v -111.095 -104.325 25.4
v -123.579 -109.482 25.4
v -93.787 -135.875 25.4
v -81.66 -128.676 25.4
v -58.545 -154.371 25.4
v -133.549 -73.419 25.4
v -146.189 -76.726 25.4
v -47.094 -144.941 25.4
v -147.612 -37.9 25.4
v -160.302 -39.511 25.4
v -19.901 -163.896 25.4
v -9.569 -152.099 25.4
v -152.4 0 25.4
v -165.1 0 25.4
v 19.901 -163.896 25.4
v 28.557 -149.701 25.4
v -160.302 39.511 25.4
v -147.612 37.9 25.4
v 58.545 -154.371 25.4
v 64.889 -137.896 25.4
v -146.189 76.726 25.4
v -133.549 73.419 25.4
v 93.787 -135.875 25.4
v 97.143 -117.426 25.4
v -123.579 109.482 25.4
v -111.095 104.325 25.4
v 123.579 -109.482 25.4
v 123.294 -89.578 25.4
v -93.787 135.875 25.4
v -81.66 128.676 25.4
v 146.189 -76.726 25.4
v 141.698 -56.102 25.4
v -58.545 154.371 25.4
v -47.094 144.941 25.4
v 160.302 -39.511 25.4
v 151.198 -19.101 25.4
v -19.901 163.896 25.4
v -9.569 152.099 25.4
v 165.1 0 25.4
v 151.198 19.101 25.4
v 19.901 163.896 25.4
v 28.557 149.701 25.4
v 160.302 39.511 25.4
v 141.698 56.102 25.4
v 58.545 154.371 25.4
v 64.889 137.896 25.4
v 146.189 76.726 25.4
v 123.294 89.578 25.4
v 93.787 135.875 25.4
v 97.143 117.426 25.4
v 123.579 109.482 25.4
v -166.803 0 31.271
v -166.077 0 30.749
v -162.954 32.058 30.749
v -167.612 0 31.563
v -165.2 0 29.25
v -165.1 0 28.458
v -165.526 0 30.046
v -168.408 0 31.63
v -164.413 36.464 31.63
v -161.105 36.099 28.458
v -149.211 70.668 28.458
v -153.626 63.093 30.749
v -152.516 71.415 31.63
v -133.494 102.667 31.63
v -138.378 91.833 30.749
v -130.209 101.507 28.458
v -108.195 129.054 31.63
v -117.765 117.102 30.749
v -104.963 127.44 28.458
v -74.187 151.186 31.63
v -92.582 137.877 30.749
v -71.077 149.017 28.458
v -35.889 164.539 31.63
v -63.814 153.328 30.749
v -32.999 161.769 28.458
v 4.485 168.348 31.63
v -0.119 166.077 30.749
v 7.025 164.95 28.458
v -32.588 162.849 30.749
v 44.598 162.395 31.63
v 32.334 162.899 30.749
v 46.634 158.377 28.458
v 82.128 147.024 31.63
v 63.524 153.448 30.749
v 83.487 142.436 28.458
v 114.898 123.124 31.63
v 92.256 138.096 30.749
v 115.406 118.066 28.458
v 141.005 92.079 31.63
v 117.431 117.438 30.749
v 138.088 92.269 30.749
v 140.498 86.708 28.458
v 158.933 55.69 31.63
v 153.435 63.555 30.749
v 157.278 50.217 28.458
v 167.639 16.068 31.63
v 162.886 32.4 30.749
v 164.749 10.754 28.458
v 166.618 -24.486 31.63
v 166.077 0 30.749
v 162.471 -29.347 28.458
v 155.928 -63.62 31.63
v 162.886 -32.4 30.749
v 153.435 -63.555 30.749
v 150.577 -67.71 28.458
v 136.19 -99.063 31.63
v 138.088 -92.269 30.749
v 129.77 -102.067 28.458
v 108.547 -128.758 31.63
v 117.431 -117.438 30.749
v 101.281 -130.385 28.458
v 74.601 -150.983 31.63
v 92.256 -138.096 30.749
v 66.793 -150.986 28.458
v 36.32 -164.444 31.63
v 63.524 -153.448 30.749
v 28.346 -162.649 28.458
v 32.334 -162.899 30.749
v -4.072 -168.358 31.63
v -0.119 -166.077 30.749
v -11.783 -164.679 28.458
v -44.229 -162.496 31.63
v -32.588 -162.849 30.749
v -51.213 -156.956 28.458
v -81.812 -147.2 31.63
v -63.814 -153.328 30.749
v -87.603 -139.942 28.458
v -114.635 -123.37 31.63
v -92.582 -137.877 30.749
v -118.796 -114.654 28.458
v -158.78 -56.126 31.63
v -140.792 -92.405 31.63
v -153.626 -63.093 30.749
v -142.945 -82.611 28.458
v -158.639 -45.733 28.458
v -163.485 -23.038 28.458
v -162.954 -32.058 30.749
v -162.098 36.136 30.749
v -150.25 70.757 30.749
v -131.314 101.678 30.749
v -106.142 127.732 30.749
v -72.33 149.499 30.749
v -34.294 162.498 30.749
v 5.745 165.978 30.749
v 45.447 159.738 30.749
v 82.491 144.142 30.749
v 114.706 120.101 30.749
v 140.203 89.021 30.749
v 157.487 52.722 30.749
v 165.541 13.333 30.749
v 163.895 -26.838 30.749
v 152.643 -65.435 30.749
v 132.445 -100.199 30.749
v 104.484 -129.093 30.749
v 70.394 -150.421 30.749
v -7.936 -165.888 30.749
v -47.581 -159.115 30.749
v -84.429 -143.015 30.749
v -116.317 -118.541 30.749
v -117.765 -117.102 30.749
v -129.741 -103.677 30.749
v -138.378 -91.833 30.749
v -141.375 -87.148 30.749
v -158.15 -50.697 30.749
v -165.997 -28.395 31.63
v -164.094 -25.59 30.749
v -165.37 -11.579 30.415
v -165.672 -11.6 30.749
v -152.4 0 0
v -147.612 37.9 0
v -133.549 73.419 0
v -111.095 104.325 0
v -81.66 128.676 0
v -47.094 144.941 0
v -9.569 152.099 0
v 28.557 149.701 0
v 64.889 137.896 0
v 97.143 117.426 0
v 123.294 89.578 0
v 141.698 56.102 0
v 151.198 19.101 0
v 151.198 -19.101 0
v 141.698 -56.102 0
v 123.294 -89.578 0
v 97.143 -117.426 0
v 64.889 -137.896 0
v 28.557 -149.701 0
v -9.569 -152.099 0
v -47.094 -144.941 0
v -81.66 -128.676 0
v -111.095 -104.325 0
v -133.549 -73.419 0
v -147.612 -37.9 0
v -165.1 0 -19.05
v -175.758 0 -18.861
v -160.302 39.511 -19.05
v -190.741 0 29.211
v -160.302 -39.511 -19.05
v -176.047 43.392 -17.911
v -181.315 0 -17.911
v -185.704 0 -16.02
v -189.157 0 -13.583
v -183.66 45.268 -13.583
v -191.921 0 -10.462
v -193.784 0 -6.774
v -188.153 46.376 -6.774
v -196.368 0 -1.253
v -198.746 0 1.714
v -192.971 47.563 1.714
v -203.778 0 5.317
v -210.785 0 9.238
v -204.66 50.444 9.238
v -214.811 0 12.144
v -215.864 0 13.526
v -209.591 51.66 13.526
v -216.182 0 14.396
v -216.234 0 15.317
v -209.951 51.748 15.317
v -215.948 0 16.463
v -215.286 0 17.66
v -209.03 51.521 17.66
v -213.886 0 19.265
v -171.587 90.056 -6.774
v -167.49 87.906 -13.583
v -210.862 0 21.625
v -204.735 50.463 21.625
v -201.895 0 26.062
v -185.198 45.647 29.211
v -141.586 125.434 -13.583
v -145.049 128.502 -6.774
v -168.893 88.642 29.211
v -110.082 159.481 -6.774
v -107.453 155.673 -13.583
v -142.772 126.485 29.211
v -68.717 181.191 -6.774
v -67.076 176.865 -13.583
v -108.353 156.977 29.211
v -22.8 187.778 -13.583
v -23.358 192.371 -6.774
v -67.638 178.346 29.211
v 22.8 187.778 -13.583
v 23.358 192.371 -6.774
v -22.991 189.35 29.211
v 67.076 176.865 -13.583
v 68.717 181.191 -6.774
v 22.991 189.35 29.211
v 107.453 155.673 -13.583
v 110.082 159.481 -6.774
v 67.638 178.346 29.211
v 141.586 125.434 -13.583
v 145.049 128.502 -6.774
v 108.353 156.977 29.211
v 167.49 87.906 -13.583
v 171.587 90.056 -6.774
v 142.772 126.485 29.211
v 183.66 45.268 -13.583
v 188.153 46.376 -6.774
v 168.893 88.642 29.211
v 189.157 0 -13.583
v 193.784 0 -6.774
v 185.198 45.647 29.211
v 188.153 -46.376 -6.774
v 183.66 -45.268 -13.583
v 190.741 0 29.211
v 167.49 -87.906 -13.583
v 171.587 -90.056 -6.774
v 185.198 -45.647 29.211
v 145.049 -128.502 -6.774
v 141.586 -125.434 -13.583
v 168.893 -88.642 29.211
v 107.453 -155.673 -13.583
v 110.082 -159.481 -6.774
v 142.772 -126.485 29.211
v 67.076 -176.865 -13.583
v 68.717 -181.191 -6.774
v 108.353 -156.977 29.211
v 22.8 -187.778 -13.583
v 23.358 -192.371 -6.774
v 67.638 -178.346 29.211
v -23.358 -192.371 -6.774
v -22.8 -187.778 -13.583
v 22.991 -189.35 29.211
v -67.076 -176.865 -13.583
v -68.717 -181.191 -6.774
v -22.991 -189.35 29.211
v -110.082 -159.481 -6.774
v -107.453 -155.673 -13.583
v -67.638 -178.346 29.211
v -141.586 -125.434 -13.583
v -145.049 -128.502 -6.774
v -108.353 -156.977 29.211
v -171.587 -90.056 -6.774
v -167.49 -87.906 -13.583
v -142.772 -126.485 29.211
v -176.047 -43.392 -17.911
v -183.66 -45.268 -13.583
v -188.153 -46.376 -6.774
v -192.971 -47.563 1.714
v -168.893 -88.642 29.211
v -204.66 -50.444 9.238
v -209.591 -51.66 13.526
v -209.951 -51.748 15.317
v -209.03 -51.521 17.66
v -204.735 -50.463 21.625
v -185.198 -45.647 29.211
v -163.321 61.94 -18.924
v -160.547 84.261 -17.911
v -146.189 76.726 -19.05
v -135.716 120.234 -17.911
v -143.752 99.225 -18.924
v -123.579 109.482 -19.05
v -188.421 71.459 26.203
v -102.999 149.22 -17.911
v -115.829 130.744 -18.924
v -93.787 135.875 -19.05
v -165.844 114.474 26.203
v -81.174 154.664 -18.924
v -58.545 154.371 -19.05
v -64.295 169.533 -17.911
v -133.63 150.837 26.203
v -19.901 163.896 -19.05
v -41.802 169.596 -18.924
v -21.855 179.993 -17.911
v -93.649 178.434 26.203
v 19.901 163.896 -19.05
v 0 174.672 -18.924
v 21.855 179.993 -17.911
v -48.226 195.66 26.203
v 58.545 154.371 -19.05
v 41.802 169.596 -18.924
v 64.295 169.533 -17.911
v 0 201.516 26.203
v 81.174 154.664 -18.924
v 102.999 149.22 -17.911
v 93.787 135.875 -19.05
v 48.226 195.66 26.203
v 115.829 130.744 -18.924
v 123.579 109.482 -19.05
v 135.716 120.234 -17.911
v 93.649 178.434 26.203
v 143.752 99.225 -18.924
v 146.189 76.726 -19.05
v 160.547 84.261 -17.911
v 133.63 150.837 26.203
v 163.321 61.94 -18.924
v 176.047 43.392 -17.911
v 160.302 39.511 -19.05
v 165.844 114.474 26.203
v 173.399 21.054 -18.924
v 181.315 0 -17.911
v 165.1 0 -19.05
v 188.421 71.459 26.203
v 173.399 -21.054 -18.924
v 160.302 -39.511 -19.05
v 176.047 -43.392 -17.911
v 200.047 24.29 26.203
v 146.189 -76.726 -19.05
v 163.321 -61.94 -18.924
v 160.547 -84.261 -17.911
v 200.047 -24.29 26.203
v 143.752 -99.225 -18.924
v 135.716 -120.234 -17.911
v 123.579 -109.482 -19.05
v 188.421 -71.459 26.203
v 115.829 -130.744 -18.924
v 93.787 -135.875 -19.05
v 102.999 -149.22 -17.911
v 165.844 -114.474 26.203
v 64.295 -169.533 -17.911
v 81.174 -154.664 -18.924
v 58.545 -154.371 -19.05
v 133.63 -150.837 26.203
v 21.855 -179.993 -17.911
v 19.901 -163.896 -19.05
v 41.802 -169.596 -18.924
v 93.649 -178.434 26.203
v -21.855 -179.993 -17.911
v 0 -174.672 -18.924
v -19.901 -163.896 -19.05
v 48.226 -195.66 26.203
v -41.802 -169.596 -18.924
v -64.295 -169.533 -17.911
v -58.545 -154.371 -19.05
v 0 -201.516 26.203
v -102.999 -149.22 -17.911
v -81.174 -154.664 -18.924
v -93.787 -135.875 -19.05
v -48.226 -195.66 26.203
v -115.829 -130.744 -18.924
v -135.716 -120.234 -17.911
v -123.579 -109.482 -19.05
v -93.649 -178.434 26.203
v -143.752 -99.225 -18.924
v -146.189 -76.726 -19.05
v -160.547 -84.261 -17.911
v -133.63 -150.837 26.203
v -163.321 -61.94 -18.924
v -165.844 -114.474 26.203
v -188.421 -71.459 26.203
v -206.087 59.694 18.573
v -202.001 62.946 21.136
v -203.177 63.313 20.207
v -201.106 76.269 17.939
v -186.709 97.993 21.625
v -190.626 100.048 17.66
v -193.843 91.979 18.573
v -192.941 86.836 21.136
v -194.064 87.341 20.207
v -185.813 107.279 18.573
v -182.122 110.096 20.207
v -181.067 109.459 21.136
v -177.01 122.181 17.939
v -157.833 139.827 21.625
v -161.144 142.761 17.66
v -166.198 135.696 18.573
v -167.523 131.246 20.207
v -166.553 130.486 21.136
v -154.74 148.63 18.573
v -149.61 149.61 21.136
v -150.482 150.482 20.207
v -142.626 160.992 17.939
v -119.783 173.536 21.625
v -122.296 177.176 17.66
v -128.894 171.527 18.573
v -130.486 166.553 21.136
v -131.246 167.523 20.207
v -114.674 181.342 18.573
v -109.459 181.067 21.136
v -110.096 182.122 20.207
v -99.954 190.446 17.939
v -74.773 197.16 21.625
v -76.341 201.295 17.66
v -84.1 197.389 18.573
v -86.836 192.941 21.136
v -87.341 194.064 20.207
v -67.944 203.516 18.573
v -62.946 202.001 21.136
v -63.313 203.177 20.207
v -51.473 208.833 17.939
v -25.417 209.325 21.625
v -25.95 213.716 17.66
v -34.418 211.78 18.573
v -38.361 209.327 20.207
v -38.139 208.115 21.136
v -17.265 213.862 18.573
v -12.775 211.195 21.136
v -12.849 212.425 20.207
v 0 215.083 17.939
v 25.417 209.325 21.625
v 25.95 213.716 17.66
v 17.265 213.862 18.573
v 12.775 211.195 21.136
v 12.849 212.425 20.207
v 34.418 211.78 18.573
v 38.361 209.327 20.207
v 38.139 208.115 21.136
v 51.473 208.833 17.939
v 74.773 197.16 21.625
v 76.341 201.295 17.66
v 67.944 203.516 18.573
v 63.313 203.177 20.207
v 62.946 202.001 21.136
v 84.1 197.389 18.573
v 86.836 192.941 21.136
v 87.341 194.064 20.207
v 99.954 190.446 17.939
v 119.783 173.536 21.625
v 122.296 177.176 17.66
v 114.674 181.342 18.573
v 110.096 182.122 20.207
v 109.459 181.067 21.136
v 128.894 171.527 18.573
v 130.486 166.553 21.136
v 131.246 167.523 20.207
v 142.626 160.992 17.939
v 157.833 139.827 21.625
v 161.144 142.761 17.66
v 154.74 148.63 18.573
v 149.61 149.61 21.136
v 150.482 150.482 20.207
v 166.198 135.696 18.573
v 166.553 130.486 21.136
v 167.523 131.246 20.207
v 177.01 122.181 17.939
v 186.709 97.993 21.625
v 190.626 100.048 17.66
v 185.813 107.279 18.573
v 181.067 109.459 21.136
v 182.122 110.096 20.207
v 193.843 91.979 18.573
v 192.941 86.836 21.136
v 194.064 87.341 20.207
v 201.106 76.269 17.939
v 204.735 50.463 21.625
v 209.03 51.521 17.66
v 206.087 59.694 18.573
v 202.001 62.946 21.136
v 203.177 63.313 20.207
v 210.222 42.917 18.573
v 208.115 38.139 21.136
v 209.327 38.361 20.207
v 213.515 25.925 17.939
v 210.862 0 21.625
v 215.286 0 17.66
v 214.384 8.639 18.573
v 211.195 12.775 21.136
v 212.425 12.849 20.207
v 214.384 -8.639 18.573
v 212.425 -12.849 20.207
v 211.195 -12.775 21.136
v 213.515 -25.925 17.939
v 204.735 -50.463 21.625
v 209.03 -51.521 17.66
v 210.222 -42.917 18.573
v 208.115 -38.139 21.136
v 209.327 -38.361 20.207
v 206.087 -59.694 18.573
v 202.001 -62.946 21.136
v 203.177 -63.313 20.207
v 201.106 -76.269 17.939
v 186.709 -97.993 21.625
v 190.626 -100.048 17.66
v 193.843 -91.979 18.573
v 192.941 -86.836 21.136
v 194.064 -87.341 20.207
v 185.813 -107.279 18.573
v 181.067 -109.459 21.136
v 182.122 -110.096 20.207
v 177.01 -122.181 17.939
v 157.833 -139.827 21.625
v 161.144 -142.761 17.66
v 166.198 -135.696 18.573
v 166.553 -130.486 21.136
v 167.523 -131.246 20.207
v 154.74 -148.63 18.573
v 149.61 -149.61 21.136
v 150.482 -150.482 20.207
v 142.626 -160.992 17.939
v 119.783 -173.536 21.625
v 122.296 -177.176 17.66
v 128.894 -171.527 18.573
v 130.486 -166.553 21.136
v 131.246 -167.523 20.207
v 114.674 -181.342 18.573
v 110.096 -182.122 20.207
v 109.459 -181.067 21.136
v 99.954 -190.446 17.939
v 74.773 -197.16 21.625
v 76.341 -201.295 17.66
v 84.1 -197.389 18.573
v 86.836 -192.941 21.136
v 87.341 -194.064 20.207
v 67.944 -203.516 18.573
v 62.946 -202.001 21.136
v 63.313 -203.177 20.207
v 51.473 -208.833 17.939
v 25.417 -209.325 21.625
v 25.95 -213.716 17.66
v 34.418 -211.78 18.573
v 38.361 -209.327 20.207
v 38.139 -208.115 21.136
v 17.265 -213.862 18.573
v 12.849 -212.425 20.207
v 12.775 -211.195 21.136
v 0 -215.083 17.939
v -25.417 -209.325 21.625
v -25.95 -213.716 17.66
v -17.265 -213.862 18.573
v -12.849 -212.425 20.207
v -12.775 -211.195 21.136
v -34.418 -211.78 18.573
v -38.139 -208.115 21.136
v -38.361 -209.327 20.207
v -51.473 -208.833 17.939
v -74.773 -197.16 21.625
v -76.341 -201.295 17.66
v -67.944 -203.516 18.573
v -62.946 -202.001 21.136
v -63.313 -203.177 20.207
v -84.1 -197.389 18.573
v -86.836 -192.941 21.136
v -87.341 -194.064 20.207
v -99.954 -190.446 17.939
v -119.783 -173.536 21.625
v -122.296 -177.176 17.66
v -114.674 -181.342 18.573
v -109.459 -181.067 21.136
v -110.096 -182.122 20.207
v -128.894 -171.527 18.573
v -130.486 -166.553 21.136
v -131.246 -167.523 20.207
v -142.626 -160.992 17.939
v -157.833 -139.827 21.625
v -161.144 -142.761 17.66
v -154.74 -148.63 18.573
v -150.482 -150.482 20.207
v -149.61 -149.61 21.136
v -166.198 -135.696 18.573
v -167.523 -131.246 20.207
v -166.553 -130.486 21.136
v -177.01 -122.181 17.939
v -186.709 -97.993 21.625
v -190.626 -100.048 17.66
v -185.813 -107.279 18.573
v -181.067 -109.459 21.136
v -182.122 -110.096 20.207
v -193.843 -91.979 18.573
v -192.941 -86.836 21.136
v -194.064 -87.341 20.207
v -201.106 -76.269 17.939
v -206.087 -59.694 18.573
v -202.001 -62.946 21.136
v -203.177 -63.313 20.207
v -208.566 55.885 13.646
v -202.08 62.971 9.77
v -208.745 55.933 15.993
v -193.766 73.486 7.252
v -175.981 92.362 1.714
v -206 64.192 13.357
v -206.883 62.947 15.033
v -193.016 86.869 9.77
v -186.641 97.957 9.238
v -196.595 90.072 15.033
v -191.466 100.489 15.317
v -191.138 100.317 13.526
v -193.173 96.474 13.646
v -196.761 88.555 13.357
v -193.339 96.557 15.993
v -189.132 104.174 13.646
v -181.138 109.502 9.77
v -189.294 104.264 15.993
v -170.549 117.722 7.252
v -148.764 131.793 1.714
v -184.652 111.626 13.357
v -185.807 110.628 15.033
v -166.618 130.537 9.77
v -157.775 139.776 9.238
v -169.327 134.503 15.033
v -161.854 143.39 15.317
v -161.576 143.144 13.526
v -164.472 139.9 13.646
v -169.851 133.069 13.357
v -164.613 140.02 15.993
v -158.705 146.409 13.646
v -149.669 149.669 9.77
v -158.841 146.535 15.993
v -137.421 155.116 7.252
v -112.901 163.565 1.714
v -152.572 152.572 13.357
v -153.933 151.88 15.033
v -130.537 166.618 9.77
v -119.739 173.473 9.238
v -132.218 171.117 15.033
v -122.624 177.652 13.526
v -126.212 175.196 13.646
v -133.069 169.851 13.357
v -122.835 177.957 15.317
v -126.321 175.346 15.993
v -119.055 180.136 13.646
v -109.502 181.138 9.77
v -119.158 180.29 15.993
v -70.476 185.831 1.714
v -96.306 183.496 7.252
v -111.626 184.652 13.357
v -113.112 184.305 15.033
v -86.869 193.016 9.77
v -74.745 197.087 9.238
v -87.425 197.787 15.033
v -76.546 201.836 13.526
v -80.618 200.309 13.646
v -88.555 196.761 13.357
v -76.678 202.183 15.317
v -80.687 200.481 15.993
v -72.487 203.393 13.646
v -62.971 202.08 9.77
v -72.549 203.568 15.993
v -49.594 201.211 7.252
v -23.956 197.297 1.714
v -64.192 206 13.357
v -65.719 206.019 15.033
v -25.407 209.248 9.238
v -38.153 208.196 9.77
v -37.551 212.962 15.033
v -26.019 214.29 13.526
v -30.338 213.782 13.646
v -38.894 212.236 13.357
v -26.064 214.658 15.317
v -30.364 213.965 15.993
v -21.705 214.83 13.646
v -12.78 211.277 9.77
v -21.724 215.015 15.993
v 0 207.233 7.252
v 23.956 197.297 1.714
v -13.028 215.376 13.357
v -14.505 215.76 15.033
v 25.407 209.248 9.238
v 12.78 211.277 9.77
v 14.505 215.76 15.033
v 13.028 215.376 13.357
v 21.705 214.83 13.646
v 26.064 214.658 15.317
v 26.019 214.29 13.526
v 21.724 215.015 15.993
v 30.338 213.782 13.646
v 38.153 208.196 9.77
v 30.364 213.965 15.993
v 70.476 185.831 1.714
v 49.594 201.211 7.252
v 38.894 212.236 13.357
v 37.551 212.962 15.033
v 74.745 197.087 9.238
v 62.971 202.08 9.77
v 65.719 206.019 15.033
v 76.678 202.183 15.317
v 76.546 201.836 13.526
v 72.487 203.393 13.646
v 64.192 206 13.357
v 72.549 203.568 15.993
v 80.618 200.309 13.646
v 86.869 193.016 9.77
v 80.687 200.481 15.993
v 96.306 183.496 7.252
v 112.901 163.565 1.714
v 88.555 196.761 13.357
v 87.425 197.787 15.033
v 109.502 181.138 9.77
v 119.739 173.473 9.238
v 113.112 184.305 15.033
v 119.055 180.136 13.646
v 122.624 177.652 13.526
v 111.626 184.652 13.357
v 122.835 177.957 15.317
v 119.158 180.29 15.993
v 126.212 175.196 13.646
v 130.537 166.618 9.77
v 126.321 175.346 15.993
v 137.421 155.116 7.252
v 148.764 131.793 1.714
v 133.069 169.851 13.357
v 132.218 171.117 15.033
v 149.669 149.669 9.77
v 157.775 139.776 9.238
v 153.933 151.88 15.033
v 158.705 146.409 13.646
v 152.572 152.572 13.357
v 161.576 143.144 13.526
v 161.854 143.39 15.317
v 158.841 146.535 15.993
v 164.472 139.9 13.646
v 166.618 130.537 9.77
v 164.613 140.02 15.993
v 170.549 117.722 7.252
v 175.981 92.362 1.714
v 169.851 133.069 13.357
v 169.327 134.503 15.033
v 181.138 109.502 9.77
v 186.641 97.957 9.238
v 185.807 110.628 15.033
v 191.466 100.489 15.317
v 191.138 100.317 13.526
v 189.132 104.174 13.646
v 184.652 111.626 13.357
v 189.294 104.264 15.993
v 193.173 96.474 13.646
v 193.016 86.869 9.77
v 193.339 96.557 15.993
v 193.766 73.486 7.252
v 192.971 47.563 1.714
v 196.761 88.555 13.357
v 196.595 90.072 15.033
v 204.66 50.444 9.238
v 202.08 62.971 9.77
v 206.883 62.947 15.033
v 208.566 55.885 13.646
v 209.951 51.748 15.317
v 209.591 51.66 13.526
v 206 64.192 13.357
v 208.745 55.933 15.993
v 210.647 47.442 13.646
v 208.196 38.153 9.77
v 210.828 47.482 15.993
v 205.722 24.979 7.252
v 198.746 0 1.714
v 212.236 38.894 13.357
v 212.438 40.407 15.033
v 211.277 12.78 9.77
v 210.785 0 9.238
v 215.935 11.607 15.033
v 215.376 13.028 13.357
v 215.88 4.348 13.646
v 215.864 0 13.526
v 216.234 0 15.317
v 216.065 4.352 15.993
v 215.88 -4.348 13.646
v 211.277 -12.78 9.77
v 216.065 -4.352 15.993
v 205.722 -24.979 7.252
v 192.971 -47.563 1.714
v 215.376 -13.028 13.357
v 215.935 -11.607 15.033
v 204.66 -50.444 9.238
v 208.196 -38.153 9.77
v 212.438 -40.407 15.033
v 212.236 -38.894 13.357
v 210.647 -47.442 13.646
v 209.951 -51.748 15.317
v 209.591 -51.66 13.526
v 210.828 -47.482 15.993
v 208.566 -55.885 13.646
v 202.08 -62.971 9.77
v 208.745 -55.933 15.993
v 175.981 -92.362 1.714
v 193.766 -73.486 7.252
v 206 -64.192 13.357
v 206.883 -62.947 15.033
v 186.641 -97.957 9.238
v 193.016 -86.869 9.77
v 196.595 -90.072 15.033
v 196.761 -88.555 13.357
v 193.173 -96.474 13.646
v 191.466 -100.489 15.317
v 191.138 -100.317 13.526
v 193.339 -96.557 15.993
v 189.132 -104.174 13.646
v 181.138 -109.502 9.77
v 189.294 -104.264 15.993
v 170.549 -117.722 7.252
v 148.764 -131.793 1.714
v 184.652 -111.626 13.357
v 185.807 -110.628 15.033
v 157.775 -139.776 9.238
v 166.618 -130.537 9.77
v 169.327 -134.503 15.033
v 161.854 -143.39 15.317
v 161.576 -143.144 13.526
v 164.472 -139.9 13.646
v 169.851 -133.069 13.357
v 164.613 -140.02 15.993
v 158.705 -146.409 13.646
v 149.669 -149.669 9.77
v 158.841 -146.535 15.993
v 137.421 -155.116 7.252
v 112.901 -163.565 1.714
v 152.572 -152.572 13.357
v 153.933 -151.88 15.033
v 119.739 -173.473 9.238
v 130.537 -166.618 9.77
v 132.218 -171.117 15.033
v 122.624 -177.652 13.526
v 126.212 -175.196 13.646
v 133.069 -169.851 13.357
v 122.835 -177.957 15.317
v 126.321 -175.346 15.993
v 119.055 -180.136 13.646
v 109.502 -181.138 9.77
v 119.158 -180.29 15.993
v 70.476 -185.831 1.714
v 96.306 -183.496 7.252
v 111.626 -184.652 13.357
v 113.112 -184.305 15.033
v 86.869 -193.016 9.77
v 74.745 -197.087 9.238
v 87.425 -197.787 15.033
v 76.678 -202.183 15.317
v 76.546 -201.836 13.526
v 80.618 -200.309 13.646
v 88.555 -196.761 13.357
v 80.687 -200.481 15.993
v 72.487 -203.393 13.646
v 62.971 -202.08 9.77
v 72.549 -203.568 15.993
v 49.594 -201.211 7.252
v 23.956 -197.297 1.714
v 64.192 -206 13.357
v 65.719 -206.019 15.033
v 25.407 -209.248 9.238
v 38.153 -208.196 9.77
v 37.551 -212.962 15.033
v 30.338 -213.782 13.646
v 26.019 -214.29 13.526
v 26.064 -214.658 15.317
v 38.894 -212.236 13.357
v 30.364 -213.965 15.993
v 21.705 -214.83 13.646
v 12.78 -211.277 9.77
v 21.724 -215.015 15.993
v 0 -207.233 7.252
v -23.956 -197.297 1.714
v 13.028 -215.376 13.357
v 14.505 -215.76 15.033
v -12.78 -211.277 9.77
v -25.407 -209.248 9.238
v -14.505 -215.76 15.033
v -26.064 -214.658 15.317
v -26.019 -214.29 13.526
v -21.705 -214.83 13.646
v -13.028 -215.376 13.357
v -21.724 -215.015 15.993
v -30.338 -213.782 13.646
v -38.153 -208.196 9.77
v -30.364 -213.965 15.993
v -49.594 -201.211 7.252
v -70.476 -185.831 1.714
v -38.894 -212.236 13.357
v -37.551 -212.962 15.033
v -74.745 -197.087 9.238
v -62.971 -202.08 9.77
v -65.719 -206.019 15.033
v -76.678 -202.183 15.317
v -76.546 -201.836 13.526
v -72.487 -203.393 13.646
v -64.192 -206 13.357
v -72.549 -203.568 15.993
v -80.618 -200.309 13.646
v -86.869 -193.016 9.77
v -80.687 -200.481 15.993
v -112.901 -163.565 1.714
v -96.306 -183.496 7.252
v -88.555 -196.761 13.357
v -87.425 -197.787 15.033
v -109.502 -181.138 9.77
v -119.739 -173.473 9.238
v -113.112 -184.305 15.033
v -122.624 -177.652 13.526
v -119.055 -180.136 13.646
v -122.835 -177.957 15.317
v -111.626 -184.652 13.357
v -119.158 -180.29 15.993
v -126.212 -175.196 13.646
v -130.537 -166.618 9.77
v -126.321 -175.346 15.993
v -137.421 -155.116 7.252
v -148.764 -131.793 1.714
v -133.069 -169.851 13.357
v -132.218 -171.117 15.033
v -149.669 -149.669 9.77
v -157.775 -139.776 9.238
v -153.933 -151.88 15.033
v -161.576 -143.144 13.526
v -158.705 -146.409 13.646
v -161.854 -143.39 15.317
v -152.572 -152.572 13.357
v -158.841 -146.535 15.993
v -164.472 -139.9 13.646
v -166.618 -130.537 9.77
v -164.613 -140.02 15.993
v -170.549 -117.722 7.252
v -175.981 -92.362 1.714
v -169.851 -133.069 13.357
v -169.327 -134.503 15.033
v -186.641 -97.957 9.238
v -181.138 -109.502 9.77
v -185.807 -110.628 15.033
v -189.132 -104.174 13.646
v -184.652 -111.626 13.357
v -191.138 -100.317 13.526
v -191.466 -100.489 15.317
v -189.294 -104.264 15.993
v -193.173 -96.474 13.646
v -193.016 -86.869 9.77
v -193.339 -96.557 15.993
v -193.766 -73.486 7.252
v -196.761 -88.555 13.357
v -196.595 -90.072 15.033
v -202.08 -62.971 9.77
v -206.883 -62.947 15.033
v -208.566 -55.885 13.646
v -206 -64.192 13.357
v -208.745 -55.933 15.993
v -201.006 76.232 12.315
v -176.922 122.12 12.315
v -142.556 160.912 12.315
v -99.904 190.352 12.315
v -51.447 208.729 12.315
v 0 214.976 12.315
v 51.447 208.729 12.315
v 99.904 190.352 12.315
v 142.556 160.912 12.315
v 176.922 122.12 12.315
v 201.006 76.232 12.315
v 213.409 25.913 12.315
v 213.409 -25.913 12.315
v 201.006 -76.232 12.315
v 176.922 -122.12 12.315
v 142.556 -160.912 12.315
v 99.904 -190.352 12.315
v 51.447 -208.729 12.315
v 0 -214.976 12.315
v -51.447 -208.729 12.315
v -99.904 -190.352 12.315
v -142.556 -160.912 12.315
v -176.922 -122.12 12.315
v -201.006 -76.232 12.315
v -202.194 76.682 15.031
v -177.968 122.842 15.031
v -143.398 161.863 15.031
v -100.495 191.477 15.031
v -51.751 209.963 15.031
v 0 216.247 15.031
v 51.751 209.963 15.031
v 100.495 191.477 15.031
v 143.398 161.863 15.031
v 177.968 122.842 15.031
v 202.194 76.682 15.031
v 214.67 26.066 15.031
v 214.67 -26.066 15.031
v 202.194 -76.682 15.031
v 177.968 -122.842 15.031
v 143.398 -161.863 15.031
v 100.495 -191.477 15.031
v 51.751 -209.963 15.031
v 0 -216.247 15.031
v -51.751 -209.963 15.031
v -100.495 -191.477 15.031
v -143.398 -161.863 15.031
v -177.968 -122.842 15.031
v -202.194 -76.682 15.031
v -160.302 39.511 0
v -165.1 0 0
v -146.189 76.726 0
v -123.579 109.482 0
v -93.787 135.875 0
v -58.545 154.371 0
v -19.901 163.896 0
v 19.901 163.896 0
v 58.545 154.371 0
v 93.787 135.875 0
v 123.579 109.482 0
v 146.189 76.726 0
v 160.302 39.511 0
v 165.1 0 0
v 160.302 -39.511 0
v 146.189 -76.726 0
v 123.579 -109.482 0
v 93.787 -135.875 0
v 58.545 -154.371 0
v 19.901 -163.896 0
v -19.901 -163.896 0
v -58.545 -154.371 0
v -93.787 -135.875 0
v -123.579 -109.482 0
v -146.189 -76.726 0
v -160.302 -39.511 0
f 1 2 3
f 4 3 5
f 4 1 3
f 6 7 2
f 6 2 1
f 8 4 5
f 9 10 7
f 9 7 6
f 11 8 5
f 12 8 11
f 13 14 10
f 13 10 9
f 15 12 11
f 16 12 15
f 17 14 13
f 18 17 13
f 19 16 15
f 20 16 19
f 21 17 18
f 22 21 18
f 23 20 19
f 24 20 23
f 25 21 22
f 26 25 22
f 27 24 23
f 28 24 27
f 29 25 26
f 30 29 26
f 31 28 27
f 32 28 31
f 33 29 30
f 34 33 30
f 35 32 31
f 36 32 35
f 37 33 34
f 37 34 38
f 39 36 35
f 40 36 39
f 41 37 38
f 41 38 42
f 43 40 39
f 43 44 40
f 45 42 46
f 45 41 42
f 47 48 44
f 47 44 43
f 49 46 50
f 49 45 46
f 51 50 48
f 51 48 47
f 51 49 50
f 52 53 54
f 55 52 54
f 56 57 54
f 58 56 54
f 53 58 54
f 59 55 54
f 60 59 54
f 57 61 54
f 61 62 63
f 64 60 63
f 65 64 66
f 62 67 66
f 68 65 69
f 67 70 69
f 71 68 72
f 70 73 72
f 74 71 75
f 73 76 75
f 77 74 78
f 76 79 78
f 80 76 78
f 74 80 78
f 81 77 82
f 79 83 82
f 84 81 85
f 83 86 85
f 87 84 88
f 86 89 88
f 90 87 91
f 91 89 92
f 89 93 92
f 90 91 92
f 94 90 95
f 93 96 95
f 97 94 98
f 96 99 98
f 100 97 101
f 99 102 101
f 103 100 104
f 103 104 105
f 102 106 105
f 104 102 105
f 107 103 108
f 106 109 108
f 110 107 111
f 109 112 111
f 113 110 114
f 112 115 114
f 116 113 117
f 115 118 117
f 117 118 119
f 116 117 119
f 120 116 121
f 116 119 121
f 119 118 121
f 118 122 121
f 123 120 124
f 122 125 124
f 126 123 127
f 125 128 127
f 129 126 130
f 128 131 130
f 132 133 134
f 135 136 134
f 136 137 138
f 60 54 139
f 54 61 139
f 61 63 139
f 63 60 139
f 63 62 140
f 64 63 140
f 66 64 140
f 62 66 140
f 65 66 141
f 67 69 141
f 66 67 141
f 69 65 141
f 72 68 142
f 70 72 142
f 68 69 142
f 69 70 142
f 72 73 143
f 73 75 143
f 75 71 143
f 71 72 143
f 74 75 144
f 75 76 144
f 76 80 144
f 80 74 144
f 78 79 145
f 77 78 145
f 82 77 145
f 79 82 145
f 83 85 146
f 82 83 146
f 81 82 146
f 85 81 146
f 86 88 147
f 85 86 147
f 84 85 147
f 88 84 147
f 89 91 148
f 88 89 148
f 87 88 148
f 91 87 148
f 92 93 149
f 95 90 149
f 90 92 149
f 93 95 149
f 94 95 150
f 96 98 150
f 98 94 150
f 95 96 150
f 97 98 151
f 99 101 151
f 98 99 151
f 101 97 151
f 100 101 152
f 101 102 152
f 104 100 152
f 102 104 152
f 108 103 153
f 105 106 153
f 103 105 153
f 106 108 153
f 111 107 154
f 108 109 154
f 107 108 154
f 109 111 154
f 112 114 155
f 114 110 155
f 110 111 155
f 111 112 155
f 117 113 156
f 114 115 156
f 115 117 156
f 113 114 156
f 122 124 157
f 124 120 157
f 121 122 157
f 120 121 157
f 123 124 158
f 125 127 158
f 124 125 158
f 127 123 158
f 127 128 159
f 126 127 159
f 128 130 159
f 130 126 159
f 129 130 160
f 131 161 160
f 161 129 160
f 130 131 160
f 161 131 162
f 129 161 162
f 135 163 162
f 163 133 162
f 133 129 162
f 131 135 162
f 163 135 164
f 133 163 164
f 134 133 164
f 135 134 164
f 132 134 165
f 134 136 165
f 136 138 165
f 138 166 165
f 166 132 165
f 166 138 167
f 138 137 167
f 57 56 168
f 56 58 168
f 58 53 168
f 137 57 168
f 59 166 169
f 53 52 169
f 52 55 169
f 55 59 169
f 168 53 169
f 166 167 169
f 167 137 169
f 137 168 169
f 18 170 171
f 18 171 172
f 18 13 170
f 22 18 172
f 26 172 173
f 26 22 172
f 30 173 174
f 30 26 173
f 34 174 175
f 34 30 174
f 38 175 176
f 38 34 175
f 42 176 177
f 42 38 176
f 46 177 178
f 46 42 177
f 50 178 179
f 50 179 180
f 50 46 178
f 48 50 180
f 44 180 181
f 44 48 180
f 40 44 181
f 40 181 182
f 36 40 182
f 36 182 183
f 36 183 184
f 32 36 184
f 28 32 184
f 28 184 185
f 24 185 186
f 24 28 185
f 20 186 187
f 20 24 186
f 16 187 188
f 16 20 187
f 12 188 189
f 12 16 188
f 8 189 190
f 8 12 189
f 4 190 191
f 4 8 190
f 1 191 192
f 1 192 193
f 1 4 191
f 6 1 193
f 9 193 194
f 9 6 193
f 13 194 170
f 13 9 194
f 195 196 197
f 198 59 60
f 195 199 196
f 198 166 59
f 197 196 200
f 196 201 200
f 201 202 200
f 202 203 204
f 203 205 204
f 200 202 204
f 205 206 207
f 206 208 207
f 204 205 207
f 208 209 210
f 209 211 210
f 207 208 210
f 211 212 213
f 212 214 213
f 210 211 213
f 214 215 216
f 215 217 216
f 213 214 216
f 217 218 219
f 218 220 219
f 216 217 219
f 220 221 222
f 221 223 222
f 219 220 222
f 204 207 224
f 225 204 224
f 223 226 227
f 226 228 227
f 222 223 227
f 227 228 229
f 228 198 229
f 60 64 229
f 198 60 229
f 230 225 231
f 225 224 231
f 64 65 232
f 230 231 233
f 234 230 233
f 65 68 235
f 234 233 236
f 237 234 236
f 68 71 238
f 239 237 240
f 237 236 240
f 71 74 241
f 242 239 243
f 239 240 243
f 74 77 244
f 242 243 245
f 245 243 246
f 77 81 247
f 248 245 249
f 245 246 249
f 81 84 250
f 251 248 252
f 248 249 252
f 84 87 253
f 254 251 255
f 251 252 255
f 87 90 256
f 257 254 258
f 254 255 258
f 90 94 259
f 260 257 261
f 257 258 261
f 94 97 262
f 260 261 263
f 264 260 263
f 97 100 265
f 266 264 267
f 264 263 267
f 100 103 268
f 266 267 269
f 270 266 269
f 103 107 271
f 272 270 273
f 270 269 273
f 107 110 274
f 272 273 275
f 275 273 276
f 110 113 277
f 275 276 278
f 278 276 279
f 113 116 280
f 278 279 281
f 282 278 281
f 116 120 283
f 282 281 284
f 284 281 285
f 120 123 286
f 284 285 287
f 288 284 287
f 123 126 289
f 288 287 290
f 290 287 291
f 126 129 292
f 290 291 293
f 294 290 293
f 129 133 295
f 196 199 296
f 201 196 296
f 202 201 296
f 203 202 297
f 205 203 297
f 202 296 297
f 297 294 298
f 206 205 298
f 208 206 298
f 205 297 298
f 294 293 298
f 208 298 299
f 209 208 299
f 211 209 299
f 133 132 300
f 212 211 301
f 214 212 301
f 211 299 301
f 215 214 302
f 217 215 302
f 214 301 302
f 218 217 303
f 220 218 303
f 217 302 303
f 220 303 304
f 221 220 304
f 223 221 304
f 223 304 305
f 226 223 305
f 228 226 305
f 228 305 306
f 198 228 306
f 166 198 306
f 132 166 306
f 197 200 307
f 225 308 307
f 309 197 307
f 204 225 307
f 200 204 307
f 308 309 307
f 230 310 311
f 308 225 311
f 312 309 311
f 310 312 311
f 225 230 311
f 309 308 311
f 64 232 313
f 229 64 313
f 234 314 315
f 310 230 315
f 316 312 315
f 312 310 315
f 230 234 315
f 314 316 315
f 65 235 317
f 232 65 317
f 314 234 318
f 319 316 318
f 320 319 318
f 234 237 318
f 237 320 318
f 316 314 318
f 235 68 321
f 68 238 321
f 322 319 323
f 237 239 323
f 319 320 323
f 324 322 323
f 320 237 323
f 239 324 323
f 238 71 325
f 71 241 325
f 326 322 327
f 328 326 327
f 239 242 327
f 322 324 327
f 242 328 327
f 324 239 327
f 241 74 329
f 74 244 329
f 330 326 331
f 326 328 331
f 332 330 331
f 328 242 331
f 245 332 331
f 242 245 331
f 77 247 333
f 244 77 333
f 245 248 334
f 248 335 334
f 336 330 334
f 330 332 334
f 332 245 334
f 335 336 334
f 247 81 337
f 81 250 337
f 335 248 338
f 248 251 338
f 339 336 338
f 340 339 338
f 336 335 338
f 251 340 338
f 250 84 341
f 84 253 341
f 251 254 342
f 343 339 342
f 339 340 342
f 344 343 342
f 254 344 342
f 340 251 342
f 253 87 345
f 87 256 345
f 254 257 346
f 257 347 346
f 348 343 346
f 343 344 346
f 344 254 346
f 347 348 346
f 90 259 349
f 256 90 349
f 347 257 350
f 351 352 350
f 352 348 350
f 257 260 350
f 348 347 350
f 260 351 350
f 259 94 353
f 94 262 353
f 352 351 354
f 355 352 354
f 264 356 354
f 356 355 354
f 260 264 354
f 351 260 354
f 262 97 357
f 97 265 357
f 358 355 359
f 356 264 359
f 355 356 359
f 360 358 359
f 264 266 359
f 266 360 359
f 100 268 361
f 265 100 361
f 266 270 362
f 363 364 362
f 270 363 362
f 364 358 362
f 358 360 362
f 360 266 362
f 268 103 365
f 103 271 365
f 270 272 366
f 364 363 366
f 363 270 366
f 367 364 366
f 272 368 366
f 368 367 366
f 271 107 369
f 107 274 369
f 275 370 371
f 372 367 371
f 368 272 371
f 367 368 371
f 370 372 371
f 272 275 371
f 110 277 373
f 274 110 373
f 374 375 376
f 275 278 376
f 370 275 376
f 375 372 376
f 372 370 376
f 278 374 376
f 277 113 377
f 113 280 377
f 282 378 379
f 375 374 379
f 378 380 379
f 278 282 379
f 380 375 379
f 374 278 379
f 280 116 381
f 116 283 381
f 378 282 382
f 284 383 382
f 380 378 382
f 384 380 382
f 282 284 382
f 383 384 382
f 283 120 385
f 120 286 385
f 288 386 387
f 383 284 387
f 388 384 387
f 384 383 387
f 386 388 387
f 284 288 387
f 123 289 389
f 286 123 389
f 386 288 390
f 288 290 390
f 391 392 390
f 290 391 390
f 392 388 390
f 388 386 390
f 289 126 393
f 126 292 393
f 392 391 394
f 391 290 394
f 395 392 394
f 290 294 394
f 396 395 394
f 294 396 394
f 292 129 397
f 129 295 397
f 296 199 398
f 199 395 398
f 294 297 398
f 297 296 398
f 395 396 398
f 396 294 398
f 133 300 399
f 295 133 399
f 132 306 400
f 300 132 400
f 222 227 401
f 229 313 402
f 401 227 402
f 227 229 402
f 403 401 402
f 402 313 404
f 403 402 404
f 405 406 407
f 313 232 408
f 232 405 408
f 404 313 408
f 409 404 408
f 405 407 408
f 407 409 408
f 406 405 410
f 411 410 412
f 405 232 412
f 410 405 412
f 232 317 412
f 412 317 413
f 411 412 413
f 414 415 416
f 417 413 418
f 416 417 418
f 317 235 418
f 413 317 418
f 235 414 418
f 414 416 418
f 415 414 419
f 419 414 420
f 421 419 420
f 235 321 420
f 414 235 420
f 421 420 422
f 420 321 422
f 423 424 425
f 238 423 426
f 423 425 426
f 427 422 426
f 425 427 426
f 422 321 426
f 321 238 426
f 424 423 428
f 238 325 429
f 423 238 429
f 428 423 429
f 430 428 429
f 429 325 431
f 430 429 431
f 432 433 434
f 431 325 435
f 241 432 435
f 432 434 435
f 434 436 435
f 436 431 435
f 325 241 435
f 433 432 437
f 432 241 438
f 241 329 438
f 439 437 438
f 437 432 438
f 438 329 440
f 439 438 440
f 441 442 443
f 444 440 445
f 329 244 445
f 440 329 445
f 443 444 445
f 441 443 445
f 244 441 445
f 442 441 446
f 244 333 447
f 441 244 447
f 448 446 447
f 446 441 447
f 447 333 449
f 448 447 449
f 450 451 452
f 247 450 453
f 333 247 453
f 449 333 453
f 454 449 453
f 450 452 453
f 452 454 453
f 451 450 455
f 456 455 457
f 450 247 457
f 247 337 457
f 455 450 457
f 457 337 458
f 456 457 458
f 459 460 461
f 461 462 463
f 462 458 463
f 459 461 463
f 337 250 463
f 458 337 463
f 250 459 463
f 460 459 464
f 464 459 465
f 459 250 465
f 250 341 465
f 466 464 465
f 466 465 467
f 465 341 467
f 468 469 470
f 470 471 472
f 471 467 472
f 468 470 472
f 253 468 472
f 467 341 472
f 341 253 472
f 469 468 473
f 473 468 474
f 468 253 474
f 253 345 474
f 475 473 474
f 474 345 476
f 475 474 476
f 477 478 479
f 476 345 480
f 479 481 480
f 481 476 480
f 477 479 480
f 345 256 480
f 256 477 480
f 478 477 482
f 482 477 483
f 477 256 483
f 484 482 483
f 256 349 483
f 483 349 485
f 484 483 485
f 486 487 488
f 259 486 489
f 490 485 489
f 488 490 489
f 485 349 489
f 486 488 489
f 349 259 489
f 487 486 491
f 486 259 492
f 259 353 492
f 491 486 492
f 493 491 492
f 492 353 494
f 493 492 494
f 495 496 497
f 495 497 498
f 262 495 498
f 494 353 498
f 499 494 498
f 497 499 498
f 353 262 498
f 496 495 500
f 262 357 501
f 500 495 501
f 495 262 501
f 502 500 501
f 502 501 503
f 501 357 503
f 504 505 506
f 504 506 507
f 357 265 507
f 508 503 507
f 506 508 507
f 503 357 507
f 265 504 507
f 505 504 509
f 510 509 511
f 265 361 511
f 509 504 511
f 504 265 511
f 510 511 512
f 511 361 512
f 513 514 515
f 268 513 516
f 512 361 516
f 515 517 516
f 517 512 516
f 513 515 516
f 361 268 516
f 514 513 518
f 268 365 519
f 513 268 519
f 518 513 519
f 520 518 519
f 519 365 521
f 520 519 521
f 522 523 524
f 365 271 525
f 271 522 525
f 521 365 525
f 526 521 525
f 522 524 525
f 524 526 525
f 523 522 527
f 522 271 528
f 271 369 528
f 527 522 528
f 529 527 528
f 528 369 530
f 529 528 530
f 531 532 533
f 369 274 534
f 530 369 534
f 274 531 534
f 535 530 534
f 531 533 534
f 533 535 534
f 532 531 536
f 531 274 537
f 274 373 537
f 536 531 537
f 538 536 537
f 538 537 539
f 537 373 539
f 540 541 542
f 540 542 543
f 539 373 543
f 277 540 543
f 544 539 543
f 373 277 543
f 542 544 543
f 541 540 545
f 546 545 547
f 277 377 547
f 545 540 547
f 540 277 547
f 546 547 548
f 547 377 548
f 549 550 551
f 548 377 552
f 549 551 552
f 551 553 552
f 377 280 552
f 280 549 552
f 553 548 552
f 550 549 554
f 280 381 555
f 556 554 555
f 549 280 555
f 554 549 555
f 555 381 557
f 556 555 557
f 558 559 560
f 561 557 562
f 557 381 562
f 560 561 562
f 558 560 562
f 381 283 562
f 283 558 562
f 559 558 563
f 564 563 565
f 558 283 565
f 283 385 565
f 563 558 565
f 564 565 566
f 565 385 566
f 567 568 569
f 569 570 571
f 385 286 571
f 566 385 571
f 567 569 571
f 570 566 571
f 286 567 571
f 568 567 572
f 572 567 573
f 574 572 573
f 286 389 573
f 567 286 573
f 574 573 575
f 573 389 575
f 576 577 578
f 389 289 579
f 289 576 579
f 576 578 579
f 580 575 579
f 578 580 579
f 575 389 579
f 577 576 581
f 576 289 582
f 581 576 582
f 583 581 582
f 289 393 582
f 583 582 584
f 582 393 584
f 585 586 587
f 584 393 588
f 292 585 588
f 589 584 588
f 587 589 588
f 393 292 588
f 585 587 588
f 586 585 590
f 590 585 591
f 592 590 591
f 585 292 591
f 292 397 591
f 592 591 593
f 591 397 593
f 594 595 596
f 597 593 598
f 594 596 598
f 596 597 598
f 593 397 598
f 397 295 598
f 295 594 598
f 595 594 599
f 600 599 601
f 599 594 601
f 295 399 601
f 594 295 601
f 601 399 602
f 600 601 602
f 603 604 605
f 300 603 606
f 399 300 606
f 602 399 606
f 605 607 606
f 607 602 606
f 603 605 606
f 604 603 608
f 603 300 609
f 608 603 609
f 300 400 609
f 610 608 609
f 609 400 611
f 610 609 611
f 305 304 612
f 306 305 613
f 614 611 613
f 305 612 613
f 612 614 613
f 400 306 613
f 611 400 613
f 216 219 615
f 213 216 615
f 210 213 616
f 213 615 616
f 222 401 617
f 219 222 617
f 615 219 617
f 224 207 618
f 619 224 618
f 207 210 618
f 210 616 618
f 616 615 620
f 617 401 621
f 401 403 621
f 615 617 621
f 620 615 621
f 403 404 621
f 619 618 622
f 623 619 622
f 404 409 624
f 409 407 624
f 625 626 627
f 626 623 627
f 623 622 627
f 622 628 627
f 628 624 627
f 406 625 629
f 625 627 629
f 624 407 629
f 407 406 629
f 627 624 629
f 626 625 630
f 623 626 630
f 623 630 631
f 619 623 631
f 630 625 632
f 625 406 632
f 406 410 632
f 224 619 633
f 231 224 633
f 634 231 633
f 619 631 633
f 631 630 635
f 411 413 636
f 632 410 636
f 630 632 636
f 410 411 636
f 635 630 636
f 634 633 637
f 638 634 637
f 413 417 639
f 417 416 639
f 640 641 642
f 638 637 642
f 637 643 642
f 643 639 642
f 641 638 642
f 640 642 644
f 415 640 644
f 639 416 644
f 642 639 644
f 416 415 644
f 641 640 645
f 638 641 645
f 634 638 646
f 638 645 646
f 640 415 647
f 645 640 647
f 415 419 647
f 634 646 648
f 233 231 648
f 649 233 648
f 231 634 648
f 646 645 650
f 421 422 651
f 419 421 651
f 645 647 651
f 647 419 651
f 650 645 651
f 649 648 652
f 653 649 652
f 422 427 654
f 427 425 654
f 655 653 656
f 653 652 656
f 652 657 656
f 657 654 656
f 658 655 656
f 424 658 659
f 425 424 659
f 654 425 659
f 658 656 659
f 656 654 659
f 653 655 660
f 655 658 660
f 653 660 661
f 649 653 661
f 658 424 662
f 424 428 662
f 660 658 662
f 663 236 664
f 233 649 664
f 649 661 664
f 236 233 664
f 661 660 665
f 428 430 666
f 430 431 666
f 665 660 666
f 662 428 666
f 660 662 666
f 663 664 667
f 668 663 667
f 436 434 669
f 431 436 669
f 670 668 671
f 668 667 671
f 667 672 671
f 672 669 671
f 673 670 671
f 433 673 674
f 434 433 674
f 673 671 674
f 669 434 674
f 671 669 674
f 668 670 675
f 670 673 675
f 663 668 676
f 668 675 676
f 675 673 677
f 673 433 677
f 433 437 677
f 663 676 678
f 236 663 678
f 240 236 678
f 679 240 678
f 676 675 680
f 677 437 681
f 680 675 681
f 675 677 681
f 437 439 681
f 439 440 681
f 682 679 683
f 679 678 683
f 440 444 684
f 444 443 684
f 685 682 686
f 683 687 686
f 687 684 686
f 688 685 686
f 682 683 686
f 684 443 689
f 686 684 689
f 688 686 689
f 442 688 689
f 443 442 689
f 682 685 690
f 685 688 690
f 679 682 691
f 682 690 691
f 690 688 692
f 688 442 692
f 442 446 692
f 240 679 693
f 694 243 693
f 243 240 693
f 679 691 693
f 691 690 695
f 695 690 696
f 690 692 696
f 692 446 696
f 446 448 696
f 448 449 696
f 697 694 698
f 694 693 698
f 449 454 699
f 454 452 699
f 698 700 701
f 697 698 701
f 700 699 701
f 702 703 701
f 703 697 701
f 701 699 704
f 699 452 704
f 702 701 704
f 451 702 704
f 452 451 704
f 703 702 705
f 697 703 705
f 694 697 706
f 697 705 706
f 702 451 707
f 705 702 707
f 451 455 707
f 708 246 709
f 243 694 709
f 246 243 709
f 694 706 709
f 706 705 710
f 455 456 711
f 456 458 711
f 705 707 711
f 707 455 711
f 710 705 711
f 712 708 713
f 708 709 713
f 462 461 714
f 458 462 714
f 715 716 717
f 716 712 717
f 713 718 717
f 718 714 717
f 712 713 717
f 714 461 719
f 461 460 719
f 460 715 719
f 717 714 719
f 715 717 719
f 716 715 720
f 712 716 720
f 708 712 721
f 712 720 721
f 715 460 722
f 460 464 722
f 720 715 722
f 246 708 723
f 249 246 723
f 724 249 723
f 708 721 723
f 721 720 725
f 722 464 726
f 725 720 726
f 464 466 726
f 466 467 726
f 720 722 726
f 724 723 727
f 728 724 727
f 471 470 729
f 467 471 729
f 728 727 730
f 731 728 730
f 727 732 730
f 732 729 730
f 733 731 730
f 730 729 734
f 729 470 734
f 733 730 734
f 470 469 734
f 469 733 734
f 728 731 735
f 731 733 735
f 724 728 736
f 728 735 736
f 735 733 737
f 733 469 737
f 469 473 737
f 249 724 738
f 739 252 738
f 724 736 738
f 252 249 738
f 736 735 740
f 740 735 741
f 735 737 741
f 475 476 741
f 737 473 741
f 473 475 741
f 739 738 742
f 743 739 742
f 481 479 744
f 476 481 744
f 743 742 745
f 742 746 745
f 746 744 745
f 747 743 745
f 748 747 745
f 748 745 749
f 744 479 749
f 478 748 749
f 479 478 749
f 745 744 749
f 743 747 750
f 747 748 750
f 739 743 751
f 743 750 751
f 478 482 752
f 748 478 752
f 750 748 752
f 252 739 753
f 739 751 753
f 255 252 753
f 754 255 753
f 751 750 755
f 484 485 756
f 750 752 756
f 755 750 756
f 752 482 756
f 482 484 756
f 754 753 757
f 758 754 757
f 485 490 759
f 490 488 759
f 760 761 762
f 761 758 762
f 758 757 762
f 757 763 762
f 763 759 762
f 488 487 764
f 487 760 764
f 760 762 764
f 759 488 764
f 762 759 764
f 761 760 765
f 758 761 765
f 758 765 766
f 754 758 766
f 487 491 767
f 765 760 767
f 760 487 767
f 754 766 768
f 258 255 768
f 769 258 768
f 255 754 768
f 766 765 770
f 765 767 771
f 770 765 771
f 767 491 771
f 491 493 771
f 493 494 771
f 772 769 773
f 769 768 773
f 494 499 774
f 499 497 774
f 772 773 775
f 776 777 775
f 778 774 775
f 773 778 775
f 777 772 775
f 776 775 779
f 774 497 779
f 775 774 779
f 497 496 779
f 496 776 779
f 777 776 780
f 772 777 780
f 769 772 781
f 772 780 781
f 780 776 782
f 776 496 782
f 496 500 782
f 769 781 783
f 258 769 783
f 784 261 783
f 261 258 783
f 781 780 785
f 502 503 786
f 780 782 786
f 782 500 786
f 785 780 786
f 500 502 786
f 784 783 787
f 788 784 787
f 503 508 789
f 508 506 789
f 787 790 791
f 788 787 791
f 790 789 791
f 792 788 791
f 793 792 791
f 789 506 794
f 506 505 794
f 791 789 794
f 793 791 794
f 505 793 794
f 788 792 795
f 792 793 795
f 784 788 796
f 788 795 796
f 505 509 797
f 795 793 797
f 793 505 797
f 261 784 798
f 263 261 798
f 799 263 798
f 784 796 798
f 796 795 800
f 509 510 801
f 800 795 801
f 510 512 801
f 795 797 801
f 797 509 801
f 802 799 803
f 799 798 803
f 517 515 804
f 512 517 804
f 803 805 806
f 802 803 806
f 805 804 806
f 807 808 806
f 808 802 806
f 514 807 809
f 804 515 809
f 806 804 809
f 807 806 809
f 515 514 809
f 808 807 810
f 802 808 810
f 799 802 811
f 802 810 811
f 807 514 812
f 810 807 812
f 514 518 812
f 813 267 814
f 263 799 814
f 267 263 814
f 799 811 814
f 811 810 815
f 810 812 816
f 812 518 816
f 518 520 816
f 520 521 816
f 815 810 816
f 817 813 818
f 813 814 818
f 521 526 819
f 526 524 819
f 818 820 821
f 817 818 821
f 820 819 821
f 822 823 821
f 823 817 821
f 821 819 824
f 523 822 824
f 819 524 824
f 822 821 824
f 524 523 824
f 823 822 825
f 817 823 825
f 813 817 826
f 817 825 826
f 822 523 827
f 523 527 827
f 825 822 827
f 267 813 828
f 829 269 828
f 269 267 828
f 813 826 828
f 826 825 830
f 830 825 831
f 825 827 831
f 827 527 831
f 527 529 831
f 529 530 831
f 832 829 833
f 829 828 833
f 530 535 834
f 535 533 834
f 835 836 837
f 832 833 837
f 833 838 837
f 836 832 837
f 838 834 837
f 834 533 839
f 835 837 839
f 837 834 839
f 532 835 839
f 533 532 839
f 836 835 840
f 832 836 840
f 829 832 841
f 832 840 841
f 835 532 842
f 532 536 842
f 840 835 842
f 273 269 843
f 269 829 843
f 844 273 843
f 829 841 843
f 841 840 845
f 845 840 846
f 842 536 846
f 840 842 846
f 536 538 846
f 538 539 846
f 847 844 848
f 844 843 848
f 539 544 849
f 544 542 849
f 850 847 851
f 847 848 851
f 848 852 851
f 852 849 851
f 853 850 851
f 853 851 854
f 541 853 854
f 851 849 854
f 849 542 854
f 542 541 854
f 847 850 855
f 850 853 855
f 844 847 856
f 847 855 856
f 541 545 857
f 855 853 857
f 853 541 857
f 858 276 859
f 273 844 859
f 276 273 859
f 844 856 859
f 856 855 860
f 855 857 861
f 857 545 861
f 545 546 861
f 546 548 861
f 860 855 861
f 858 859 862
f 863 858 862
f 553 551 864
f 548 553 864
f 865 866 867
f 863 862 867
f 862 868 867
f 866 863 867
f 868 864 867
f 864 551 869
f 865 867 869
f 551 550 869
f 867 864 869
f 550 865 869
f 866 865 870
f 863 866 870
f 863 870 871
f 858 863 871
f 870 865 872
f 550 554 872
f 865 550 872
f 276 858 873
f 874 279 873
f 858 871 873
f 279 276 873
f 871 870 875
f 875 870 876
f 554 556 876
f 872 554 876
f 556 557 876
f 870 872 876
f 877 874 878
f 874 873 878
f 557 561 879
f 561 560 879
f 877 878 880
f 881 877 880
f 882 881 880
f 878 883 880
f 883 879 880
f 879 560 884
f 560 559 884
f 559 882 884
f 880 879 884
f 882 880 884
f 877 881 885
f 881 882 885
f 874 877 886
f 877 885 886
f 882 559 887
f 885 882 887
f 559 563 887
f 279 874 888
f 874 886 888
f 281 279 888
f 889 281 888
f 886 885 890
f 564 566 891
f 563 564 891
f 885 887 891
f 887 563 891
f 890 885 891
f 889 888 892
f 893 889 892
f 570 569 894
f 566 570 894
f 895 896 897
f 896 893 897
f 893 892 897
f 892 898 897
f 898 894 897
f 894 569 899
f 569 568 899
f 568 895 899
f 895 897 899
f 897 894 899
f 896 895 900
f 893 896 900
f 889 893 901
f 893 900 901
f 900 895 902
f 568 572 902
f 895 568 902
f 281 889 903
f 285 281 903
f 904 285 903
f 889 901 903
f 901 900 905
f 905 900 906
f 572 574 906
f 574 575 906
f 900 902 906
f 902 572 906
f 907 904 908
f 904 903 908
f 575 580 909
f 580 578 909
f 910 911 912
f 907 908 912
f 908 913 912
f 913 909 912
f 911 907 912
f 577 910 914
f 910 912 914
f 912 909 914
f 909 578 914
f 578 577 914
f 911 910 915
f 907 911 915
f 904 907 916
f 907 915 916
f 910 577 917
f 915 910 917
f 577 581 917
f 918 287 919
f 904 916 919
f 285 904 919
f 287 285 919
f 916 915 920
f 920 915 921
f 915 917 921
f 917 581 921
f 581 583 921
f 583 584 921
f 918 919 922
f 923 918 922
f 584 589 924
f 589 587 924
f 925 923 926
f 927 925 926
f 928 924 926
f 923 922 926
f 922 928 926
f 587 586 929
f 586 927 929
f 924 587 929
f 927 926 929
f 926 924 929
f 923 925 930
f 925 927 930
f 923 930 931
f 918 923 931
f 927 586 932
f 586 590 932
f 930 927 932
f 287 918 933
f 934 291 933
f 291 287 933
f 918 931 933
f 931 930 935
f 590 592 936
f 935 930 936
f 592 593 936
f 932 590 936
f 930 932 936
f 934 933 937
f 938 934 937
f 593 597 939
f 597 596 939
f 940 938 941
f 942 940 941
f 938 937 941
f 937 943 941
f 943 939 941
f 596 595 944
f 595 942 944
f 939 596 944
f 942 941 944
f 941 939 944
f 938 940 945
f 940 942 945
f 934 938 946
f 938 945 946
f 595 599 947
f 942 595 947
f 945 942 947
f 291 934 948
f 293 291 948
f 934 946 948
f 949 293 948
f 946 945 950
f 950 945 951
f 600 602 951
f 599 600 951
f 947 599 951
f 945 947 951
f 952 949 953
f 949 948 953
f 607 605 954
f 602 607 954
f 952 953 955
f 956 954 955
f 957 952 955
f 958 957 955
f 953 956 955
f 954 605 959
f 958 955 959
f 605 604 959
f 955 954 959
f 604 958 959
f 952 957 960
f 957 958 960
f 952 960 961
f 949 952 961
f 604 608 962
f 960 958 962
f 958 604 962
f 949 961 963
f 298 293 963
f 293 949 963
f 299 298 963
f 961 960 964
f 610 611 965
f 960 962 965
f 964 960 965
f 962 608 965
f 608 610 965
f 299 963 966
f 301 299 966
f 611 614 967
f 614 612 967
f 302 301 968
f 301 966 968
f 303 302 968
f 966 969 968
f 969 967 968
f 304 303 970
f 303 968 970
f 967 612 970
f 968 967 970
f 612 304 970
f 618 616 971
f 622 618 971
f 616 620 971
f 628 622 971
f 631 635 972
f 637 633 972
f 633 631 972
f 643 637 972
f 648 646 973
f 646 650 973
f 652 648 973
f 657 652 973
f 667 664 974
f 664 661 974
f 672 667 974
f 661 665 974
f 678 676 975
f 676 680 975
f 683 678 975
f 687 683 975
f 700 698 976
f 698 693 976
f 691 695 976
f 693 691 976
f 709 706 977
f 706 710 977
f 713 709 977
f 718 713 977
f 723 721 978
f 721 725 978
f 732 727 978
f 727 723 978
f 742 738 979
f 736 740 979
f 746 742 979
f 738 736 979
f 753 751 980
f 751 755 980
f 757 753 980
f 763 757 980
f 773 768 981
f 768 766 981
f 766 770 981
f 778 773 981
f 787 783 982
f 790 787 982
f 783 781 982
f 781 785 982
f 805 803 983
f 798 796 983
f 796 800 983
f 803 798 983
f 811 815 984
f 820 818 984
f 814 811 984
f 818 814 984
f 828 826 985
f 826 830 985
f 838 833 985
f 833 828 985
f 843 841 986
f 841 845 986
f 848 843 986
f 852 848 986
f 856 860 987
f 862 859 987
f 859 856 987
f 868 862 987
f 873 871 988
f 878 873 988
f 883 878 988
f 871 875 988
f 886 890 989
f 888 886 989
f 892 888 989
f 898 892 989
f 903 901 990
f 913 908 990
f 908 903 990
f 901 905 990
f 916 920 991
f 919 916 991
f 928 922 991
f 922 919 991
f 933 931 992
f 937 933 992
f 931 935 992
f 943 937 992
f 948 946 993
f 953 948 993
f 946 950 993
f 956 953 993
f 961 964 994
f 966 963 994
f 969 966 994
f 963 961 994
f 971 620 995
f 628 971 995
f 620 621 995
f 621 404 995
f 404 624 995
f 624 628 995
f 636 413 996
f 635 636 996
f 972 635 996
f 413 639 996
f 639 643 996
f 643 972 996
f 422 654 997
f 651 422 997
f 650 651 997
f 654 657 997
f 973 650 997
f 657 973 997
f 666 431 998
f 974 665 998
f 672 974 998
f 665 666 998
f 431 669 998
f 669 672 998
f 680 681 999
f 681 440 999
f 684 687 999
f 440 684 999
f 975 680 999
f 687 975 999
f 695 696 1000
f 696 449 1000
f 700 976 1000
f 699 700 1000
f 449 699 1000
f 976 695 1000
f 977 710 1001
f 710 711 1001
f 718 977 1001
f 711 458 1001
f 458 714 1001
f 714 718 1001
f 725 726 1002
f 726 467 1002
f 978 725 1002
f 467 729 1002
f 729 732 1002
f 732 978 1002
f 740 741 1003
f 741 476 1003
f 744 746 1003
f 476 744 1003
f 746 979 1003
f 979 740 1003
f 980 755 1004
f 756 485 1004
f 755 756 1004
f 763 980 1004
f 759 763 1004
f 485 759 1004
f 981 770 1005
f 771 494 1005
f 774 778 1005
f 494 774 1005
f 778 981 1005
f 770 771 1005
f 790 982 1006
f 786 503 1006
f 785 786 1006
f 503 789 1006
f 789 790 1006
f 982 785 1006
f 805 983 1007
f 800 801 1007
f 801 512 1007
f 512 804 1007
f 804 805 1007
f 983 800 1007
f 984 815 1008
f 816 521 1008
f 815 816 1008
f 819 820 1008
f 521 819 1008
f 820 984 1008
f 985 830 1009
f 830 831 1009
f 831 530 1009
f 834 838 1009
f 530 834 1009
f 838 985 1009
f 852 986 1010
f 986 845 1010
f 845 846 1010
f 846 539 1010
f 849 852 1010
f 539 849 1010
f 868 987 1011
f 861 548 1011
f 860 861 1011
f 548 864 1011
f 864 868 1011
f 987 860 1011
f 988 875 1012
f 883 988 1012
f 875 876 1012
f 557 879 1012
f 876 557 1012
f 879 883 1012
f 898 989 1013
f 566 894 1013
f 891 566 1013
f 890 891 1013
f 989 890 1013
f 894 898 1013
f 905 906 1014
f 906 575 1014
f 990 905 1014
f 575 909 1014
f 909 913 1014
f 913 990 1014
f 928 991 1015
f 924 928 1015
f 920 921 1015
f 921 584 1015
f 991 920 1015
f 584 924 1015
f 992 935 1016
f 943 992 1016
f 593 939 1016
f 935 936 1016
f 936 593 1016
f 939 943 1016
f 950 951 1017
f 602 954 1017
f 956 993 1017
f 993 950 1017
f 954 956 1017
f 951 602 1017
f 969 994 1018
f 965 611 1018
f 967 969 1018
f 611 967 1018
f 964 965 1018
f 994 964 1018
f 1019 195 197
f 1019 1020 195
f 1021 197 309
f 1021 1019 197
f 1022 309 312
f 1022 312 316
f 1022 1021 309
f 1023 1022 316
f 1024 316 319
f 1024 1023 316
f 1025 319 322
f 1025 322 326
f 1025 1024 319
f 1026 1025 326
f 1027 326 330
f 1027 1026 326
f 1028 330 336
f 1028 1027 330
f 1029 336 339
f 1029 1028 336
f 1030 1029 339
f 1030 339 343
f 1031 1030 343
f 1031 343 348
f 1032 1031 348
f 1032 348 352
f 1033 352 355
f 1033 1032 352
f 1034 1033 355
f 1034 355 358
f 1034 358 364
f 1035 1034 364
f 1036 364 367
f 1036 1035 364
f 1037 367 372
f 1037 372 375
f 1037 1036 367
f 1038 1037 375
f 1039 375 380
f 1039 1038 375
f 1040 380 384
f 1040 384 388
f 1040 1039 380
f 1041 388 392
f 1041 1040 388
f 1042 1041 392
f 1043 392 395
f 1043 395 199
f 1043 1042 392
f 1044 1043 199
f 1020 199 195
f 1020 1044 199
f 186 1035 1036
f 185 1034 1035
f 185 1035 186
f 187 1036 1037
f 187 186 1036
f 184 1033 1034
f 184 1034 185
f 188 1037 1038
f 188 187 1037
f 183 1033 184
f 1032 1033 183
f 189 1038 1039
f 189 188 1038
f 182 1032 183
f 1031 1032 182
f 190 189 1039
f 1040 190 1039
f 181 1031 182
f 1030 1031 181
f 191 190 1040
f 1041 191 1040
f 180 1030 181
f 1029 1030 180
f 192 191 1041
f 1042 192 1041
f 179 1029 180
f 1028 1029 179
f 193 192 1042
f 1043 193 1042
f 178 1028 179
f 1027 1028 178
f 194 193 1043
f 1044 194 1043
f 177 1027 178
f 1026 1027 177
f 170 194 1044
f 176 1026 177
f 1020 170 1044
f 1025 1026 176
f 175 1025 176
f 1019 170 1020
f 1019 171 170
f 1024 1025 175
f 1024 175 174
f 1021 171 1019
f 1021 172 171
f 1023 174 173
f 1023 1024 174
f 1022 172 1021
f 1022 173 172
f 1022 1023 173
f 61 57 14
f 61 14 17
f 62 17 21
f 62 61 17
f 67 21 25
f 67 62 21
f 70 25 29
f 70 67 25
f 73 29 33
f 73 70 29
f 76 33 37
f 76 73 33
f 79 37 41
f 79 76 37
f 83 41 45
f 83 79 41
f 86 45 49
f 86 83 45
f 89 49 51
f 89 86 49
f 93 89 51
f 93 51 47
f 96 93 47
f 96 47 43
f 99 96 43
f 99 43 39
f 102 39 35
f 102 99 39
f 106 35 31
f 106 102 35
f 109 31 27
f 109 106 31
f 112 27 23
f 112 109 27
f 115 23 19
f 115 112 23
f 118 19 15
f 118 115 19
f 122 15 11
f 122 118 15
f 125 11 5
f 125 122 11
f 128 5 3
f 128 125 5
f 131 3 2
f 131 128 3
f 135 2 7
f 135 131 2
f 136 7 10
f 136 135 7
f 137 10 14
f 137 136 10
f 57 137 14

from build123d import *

# Parameters (mm, degrees)
F3_R = 3.175


with BuildPart() as f2:
    # F1 (on Front) → F2 (revolve)
    with BuildSketch(Plane.XZ):
        with BuildLine():
            Line((-165.1, 0), (-152.4, 0))
            Line((-152.4, 0), (-152.4, 25.4))
            Line((-152.4, 25.4), (-165.1, 25.4))
            Line((-165.1, 25.4), (-165.1, 31.75))
            add(Edge.make_bspline(
                [(-165.1, -19.05), (-173.6446641297, -18.9837780367), (-181.2460331174, -19.3475446829), (-194.0075645783, -11.022645064), (-195.3869539015, 3.9754763893), (-224.8387234307, 12.9802804063), (-200.1375677161, 29.6974381017), (-176.9911993258, 31.3777180289), (-165.1, 31.75)],
                knots=[0, 0, 0, 0, 0.1567613221, 0.2896699988, 0.4324502723, 0.6058333187, 0.7678080364, 1, 1, 1, 1], degree=3))
            Line((-165.1, -19.05), (-165.1, 0))
        make_face()
    revolve(axis=Axis((0, 0, -4.2362962902), (0, 0, -1)))

    # F3
    f3_edges = [f2.edges().sort_by_distance(p)[0] for p in [
        (165.1, 0, 31.75),
    ]]
    fillet(f3_edges, radius=F3_R)


solid = f2.part
